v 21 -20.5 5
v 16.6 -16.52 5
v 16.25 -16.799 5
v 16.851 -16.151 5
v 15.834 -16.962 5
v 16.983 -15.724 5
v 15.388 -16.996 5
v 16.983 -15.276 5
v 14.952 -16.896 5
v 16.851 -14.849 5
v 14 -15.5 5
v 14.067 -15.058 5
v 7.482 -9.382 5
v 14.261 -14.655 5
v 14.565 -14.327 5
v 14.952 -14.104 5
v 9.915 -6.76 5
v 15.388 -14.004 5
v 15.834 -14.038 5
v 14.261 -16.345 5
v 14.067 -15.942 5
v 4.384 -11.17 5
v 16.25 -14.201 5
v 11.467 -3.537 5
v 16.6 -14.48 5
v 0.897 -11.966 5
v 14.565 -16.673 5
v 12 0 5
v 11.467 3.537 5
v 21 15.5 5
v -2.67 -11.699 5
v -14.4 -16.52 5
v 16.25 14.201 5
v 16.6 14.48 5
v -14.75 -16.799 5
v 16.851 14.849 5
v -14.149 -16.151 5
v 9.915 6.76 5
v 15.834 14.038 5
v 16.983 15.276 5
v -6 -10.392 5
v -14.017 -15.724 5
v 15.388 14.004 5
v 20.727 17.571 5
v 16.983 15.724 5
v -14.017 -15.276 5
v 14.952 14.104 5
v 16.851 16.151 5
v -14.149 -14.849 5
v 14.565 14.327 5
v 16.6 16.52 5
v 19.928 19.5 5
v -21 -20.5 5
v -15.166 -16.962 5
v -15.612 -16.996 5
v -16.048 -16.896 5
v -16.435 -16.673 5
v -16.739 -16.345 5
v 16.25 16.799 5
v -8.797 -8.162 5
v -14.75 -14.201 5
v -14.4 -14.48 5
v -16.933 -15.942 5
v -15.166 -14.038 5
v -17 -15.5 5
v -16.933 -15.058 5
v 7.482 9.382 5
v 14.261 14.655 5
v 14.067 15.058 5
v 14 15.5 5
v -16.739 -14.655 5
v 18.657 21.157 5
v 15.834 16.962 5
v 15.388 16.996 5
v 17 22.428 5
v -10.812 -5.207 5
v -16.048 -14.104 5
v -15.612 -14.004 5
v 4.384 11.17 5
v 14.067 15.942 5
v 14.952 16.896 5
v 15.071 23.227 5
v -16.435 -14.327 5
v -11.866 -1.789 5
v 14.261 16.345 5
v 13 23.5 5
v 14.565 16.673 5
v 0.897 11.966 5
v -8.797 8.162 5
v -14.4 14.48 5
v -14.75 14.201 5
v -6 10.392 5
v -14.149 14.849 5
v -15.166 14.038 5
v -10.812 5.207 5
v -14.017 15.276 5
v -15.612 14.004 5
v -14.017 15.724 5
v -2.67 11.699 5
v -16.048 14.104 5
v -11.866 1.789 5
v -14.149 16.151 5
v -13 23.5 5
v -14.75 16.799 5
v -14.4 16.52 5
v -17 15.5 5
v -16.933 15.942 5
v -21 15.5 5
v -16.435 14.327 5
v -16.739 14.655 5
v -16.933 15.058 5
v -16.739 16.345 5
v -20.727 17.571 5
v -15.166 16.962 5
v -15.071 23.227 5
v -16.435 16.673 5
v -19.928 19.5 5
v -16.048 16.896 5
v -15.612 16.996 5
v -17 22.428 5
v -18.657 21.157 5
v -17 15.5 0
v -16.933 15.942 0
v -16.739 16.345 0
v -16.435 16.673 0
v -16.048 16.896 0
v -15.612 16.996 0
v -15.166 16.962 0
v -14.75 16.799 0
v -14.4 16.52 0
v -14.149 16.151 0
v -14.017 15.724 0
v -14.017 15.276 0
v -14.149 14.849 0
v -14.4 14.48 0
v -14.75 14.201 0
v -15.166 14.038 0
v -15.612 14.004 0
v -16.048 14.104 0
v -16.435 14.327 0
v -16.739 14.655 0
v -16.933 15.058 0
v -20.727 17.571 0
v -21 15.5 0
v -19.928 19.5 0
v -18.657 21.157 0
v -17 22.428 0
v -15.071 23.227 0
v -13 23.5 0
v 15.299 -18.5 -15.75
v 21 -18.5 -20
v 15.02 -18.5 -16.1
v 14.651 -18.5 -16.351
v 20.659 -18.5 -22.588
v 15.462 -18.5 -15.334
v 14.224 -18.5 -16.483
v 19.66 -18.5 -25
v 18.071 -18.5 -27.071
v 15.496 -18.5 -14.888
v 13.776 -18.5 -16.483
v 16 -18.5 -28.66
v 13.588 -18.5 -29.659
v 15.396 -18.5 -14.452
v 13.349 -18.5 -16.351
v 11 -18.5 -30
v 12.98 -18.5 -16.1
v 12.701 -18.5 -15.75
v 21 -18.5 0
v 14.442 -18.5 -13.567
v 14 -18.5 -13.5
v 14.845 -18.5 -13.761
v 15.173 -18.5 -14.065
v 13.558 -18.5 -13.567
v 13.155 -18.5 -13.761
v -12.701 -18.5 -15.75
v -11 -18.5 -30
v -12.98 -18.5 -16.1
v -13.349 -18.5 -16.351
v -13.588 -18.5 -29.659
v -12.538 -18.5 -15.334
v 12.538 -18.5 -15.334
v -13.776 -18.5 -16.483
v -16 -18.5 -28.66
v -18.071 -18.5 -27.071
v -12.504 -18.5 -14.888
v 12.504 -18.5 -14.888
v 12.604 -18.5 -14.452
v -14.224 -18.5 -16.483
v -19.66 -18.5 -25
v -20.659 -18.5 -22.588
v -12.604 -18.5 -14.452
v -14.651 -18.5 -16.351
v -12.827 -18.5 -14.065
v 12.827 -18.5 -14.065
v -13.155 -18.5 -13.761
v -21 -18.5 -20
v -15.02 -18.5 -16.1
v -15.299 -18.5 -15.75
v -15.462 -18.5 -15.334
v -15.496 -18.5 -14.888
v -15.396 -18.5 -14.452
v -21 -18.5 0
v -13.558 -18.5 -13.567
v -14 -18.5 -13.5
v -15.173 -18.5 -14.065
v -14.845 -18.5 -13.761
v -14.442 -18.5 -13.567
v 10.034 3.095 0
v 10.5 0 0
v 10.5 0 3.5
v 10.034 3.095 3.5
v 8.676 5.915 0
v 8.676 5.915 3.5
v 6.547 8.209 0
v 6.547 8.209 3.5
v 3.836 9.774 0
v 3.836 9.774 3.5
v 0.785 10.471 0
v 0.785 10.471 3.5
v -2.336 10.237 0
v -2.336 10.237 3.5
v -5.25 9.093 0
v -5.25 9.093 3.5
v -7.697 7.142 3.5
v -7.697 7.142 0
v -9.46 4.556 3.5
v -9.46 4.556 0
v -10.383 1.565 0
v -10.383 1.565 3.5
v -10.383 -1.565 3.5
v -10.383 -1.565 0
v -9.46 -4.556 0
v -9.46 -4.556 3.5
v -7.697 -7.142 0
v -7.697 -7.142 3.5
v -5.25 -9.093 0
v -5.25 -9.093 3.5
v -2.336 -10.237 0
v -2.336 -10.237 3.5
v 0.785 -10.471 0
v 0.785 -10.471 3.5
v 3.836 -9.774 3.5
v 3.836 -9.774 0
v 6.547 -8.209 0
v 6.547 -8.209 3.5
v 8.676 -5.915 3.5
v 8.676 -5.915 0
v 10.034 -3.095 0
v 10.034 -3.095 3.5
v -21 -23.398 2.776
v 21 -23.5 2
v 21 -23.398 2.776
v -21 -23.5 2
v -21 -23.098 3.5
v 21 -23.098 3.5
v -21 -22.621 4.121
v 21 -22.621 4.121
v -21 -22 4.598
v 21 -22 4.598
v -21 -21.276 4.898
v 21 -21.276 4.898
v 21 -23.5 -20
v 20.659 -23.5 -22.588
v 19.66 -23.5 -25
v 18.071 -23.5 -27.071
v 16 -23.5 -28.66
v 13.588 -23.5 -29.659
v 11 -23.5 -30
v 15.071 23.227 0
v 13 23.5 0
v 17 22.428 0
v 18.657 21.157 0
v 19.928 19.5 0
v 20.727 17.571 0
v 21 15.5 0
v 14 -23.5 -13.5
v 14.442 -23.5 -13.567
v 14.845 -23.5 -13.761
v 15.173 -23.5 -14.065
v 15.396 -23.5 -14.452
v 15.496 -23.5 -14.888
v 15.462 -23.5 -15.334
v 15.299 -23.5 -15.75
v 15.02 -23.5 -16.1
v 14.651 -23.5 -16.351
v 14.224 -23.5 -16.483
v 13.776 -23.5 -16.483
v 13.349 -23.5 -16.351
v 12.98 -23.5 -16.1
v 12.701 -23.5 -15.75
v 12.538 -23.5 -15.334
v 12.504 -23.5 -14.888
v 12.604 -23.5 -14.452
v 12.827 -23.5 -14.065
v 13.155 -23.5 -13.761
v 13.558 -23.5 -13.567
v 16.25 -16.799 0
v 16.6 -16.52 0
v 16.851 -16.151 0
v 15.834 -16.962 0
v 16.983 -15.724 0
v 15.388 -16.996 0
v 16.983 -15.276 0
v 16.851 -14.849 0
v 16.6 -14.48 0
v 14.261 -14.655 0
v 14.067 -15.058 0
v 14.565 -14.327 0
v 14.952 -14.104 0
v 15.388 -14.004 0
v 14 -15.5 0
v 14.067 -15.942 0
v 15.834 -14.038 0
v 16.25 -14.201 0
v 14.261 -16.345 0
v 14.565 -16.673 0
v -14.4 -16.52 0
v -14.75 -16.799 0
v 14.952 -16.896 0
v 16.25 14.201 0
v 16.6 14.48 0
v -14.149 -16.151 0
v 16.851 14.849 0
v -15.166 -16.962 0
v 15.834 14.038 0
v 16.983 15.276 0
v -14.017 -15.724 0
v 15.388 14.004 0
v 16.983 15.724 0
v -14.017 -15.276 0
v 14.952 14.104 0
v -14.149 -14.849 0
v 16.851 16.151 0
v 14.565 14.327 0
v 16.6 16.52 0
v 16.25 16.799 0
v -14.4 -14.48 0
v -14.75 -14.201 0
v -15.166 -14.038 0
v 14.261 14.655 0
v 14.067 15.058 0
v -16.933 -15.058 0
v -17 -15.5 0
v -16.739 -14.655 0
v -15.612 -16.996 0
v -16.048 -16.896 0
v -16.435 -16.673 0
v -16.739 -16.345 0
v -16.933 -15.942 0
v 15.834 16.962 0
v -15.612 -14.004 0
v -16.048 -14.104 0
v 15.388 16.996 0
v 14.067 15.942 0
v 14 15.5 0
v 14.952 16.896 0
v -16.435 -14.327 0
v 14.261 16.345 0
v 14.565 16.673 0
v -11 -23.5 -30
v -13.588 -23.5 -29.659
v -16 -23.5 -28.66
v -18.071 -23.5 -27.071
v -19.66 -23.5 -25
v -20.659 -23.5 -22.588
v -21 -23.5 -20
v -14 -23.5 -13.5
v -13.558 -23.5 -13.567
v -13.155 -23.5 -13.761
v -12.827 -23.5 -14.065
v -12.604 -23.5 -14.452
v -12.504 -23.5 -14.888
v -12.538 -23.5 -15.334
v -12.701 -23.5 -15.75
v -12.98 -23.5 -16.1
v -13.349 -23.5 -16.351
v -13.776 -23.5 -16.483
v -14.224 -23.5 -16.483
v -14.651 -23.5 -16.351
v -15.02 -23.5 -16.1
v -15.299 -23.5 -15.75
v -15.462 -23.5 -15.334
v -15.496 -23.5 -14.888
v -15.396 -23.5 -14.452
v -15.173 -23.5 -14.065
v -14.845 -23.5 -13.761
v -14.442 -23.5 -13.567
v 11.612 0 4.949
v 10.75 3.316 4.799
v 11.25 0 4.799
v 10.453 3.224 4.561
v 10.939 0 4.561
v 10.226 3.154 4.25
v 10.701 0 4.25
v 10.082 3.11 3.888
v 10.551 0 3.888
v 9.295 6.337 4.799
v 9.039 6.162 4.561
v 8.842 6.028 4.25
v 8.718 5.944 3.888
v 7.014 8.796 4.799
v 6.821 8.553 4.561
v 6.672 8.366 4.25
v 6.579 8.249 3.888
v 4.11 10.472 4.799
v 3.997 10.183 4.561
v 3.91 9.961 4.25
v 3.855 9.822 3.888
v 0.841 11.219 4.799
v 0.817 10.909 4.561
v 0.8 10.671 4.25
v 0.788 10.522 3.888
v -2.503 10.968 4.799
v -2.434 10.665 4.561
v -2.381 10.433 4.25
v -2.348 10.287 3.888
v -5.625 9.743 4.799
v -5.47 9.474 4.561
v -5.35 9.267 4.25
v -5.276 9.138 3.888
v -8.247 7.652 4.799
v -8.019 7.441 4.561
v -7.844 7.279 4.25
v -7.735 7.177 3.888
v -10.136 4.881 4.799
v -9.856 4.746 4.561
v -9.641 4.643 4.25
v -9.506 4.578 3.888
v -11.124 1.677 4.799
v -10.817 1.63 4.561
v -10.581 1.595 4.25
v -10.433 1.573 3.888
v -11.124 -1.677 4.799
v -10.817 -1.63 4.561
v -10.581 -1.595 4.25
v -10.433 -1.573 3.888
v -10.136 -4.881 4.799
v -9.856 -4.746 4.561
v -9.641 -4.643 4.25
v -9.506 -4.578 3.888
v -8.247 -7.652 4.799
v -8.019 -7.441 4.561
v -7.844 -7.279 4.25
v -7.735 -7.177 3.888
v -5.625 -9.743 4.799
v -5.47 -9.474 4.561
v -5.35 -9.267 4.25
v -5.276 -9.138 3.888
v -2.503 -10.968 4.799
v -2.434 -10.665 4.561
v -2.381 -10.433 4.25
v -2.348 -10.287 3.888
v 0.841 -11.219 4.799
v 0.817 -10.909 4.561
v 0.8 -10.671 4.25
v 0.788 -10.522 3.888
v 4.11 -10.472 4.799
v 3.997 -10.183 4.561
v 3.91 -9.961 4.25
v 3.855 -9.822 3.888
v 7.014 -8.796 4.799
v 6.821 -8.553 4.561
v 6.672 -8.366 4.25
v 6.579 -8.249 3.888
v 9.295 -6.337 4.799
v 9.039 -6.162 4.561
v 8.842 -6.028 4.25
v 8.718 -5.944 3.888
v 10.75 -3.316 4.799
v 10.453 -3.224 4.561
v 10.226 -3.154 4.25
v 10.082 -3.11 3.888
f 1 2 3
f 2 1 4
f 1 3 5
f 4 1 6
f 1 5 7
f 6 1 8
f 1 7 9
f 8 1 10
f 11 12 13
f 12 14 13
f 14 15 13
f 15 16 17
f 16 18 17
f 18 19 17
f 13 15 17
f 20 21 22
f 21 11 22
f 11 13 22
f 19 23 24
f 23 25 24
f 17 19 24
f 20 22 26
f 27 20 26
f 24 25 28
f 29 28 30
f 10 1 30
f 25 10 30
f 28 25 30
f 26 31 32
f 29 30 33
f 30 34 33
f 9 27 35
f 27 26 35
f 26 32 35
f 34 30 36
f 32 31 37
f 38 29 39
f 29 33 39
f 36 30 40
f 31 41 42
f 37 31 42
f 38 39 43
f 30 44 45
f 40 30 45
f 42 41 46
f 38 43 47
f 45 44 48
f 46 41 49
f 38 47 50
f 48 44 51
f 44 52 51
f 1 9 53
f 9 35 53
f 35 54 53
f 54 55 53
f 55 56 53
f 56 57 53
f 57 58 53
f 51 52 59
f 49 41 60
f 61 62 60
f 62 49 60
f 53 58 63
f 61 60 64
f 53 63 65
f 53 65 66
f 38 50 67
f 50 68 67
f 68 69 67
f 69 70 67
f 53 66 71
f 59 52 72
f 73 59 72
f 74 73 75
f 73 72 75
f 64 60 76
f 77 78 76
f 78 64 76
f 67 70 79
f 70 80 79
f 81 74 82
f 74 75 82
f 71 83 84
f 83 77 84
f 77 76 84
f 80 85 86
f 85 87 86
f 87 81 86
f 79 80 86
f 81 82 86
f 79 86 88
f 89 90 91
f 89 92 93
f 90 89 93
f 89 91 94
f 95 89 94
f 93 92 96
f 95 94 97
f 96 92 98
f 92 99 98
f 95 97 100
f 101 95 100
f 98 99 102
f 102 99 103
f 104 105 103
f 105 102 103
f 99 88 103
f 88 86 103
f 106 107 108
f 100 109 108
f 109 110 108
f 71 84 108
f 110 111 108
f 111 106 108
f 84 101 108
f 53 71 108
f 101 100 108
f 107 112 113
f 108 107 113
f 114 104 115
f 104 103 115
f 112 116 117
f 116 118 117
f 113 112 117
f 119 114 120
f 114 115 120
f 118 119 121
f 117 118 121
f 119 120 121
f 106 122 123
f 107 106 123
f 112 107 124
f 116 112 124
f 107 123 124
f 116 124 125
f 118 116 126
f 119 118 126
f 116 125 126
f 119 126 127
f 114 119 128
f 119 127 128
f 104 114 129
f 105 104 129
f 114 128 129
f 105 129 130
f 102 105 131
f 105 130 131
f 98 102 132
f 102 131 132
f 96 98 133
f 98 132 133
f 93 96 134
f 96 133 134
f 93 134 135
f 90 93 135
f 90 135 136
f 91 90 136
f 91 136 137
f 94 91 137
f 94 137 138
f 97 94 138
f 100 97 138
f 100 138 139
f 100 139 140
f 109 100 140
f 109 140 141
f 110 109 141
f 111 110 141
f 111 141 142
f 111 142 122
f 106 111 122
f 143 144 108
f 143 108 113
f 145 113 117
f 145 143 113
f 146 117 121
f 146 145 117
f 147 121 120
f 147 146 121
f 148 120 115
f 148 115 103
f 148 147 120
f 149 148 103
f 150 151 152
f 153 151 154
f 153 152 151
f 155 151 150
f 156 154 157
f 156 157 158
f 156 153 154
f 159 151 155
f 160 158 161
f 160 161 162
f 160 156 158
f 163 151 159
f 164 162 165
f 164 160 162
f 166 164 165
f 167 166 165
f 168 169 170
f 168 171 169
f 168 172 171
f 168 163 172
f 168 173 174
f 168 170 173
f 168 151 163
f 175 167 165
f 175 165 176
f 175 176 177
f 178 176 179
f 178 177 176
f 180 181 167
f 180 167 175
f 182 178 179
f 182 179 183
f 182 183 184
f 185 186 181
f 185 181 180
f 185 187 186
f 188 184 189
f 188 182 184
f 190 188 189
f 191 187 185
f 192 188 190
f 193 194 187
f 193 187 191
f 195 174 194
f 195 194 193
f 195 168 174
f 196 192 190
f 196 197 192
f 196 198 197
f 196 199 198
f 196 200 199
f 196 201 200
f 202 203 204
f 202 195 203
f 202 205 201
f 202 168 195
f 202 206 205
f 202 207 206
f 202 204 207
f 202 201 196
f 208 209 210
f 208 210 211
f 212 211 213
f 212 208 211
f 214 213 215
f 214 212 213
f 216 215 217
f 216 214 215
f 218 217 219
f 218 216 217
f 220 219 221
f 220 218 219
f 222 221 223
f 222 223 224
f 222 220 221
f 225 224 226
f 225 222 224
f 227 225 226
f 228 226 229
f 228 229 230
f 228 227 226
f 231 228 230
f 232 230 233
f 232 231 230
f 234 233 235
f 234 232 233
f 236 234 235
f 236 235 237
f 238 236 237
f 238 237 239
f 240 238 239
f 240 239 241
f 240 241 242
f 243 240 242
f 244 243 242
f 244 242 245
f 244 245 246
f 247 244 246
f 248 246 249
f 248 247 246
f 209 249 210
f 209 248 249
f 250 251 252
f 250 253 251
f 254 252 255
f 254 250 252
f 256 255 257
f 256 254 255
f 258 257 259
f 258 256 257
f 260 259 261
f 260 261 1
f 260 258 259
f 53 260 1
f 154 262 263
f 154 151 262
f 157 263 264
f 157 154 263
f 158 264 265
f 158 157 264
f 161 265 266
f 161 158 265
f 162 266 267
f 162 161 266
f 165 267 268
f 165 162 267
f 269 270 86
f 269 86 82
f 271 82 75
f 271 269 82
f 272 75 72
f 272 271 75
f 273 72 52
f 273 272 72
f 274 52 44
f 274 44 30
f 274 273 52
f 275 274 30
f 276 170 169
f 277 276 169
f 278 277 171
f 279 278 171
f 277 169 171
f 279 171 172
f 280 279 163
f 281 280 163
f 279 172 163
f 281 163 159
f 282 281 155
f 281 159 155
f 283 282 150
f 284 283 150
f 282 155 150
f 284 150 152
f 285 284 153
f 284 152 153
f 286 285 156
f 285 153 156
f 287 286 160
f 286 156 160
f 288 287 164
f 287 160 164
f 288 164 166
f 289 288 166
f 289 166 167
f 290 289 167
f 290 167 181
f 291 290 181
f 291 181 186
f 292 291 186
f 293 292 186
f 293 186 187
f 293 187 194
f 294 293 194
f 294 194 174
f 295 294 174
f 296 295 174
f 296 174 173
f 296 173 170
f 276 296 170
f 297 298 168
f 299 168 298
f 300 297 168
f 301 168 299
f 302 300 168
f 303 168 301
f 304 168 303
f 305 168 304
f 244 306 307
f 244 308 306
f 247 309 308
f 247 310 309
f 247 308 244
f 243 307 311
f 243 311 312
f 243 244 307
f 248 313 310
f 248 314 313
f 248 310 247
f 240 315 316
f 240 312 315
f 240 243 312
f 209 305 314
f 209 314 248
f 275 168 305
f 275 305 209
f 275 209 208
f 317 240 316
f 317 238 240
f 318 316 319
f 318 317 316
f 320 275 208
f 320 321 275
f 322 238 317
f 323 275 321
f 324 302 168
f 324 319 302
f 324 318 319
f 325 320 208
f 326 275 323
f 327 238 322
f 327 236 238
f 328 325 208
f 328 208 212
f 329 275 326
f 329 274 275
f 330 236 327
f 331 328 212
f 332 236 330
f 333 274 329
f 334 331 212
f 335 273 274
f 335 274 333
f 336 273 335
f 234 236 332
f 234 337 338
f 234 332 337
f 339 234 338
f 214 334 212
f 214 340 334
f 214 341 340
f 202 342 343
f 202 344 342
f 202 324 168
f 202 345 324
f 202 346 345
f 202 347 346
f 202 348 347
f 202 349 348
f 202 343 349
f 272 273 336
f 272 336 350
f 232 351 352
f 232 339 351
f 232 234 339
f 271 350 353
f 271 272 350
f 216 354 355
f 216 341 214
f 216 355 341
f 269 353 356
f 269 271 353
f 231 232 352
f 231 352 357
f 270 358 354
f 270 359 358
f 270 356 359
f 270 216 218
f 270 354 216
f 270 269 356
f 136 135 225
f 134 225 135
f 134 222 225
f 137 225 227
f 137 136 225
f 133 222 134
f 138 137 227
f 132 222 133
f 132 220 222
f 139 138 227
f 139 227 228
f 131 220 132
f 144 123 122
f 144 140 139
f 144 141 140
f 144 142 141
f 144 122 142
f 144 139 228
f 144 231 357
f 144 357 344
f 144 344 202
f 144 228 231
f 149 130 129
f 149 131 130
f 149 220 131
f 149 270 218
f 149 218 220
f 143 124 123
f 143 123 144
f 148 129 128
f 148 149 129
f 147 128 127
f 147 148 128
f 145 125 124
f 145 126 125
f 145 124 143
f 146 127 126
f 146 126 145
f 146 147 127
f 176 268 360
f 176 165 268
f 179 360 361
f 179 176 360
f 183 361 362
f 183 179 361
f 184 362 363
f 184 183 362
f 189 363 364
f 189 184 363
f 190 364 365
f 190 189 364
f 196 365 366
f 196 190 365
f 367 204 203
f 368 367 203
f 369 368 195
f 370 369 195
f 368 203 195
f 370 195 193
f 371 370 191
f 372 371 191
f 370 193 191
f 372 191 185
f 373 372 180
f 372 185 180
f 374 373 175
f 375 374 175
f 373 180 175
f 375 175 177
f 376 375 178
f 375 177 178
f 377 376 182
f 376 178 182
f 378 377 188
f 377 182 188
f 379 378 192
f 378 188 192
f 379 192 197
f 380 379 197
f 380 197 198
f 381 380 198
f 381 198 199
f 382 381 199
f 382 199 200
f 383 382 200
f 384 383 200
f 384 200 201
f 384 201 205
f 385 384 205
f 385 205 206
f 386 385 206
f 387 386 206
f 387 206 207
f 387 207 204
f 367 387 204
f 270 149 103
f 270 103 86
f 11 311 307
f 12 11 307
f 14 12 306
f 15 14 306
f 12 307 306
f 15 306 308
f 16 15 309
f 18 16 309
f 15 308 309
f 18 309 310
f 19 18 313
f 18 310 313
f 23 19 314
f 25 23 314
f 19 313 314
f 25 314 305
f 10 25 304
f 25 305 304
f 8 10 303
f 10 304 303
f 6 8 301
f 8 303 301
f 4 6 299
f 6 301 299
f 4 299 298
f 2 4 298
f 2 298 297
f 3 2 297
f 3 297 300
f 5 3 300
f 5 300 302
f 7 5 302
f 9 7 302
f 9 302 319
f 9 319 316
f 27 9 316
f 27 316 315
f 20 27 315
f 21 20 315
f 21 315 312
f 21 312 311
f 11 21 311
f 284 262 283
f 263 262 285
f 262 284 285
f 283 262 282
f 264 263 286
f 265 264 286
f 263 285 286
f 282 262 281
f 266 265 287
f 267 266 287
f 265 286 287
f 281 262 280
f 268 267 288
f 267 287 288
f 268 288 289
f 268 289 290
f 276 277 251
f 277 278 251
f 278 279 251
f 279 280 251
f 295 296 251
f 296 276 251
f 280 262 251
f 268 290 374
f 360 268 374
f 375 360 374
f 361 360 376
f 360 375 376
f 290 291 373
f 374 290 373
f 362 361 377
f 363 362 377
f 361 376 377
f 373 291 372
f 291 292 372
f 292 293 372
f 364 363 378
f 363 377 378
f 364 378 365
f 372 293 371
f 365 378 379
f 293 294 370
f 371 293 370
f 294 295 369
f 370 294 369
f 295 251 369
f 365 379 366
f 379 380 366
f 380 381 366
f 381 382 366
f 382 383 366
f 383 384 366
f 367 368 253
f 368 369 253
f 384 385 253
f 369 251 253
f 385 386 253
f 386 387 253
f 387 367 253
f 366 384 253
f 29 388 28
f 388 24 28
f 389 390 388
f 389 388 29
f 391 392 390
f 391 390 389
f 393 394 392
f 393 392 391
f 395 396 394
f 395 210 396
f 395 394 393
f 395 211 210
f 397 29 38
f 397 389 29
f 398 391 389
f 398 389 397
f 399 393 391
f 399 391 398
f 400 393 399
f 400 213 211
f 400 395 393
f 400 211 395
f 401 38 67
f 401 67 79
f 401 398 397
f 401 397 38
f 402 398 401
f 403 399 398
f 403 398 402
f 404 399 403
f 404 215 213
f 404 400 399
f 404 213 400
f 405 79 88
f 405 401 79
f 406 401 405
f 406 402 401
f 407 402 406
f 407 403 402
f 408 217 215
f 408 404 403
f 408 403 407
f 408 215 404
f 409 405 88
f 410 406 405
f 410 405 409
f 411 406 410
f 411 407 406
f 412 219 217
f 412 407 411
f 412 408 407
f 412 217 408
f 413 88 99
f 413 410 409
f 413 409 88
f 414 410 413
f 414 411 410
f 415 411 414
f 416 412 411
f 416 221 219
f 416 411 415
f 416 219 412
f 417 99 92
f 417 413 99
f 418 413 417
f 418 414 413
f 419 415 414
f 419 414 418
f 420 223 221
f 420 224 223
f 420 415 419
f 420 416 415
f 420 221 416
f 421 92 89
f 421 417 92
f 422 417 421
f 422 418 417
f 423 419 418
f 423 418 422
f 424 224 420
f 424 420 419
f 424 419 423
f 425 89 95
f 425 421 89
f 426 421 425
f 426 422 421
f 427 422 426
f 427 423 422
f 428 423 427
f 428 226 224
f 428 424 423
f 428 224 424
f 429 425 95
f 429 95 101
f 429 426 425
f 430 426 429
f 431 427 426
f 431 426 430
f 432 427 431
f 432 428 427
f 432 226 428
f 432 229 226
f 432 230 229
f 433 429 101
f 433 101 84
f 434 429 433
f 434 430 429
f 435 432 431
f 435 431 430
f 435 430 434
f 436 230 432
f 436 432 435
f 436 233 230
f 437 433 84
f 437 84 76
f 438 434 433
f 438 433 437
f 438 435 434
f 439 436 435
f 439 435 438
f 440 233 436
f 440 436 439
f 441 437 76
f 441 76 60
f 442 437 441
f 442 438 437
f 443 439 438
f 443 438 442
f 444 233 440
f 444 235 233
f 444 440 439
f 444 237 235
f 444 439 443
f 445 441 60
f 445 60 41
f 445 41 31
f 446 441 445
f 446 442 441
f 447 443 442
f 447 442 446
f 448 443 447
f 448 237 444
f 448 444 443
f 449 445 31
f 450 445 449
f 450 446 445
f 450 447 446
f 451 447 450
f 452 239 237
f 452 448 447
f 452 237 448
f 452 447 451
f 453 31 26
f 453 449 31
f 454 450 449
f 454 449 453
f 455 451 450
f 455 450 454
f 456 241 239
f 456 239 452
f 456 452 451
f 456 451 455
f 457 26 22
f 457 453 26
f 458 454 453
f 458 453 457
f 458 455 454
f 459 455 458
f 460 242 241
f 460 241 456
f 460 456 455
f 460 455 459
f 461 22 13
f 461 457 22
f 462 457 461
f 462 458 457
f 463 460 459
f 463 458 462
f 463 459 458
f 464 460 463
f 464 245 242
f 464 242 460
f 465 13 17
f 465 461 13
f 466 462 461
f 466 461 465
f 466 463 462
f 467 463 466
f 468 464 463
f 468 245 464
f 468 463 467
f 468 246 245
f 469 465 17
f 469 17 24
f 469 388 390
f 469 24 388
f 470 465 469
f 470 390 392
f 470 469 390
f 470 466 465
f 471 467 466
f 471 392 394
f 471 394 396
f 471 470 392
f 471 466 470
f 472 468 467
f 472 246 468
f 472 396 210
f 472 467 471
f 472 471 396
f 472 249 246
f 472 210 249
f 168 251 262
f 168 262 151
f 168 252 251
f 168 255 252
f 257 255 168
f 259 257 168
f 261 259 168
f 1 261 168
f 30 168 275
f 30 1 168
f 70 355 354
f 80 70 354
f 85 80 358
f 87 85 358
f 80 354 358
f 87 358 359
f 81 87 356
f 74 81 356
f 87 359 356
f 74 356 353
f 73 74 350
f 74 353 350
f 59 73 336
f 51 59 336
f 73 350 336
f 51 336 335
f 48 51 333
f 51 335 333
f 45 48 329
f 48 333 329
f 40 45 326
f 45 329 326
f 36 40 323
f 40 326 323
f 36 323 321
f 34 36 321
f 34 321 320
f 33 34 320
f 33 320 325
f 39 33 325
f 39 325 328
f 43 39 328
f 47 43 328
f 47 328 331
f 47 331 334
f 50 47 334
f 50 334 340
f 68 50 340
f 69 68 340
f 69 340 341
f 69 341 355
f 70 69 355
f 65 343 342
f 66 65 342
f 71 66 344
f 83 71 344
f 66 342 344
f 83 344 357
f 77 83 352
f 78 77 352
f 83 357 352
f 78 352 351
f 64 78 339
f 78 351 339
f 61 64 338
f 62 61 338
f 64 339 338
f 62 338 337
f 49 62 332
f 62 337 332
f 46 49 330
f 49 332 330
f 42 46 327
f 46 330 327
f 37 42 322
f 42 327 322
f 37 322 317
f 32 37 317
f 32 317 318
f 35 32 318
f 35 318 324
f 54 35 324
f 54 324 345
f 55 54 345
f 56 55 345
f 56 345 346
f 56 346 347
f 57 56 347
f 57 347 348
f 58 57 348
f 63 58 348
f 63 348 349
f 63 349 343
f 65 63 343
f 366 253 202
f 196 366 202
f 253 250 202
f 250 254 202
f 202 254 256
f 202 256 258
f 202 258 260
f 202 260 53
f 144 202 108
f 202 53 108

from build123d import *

# Parameters (mm, degrees)
ESQUISSE1_R             = 10.5
BOSS_EXTRU_1_DEPTH      = 5
ESQUISSE2_W             = 42
ESQUISSE2_H             = 5
BOSS_EXTRU_2_DEPTH      = 30
ESQUISSE3_R             = 1.5
ENL_V_MAT_EXTRU_1_DEPTH = 30
CONG_1_R                = 10
CONG_2_R                = 3
ESQUISSE4_R             = 1.5
ESQUISSE4_R_2           = 1.499999579
ENL_V_MAT_EXTRU_2_DEPTH = 44.511492735
CONG_3_R                = 1.5


with BuildPart() as part:
    # Esquisse1 → Boss.-Extru.1 (new body)
    with BuildSketch(Plane.XY):
        with BuildLine():
            Line((-13, 23.5), (13, 23.5))
            ThreePointArc((13, 23.5), (18.656854249, 21.156854249), (21, 15.5))
            Line((21, 15.5), (21, -23.5))
            Line((21, -23.5), (-21, -23.5))
            Line((-21, -23.5), (-21, 15.5))
            ThreePointArc((-21, 15.5), (-18.656854249, 21.156854249), (-13, 23.5))
        make_face()
        Circle(ESQUISSE1_R, mode=Mode.SUBTRACT)
    extrude(amount=BOSS_EXTRU_1_DEPTH)

    # Esquisse2 → Boss.-Extru.2 (add)
    with BuildSketch(Plane(origin=(0, 0, 0), x_dir=(-1, 0, 0), z_dir=(0, 0, -1))):
        with Locations((0, -21)):
            Rectangle(ESQUISSE2_W, ESQUISSE2_H)
    extrude(amount=BOSS_EXTRU_2_DEPTH)

    # Esquisse3 → Enlèv. mat.-Extru.1 (cut)
    with BuildSketch(Plane(origin=(0, -18.5, 0), x_dir=(1, 0, 0), z_dir=(0, 1, 0))):
        with Locations(Location((-14, 15, 0), (0, 0, 270))):
            Circle(ESQUISSE3_R)
        with Locations(Location((14, 15, 0), (0, 0, 270))):
            Circle(ESQUISSE3_R)
    extrude(amount=-ENL_V_MAT_EXTRU_1_DEPTH, mode=Mode.SUBTRACT)

    # Congé1
    cong_1_edges = [part.edges().sort_by_distance(p)[0] for p in [
        (-21, -21, -30),
        (21, -21, -30),
    ]]
    fillet(cong_1_edges, radius=CONG_1_R)

    # Congé2
    cong_2_edges = [part.edges().sort_by_distance(p)[0] for p in [
        (0, -23.5, 5),
    ]]
    fillet(cong_2_edges, radius=CONG_2_R)

    # Esquisse4 → Enlèv. mat.-Extru.2 (cut, through all)
    with BuildSketch(Plane(origin=(0, 0, 0), x_dir=(-1, 0, 0), z_dir=(0, 0, -1))):
        with Locations((-15.5, 15.5)):
            Circle(ESQUISSE4_R)
        with Locations((15.5, 15.5)):
            Circle(ESQUISSE4_R)
        with Locations((-15.499999687, -15.500000313)):
            Circle(ESQUISSE4_R_2)
        with Locations((15.5, -15.5)):
            Circle(ESQUISSE4_R)
    extrude(amount=-ENL_V_MAT_EXTRU_2_DEPTH, mode=Mode.SUBTRACT)

    # Congé3
    cong_3_edges = [part.edges().sort_by_distance(p)[0] for p in [
        (-10.5, 0, 5),
    ]]
    fillet(cong_3_edges, radius=CONG_3_R)


solid = part.part
